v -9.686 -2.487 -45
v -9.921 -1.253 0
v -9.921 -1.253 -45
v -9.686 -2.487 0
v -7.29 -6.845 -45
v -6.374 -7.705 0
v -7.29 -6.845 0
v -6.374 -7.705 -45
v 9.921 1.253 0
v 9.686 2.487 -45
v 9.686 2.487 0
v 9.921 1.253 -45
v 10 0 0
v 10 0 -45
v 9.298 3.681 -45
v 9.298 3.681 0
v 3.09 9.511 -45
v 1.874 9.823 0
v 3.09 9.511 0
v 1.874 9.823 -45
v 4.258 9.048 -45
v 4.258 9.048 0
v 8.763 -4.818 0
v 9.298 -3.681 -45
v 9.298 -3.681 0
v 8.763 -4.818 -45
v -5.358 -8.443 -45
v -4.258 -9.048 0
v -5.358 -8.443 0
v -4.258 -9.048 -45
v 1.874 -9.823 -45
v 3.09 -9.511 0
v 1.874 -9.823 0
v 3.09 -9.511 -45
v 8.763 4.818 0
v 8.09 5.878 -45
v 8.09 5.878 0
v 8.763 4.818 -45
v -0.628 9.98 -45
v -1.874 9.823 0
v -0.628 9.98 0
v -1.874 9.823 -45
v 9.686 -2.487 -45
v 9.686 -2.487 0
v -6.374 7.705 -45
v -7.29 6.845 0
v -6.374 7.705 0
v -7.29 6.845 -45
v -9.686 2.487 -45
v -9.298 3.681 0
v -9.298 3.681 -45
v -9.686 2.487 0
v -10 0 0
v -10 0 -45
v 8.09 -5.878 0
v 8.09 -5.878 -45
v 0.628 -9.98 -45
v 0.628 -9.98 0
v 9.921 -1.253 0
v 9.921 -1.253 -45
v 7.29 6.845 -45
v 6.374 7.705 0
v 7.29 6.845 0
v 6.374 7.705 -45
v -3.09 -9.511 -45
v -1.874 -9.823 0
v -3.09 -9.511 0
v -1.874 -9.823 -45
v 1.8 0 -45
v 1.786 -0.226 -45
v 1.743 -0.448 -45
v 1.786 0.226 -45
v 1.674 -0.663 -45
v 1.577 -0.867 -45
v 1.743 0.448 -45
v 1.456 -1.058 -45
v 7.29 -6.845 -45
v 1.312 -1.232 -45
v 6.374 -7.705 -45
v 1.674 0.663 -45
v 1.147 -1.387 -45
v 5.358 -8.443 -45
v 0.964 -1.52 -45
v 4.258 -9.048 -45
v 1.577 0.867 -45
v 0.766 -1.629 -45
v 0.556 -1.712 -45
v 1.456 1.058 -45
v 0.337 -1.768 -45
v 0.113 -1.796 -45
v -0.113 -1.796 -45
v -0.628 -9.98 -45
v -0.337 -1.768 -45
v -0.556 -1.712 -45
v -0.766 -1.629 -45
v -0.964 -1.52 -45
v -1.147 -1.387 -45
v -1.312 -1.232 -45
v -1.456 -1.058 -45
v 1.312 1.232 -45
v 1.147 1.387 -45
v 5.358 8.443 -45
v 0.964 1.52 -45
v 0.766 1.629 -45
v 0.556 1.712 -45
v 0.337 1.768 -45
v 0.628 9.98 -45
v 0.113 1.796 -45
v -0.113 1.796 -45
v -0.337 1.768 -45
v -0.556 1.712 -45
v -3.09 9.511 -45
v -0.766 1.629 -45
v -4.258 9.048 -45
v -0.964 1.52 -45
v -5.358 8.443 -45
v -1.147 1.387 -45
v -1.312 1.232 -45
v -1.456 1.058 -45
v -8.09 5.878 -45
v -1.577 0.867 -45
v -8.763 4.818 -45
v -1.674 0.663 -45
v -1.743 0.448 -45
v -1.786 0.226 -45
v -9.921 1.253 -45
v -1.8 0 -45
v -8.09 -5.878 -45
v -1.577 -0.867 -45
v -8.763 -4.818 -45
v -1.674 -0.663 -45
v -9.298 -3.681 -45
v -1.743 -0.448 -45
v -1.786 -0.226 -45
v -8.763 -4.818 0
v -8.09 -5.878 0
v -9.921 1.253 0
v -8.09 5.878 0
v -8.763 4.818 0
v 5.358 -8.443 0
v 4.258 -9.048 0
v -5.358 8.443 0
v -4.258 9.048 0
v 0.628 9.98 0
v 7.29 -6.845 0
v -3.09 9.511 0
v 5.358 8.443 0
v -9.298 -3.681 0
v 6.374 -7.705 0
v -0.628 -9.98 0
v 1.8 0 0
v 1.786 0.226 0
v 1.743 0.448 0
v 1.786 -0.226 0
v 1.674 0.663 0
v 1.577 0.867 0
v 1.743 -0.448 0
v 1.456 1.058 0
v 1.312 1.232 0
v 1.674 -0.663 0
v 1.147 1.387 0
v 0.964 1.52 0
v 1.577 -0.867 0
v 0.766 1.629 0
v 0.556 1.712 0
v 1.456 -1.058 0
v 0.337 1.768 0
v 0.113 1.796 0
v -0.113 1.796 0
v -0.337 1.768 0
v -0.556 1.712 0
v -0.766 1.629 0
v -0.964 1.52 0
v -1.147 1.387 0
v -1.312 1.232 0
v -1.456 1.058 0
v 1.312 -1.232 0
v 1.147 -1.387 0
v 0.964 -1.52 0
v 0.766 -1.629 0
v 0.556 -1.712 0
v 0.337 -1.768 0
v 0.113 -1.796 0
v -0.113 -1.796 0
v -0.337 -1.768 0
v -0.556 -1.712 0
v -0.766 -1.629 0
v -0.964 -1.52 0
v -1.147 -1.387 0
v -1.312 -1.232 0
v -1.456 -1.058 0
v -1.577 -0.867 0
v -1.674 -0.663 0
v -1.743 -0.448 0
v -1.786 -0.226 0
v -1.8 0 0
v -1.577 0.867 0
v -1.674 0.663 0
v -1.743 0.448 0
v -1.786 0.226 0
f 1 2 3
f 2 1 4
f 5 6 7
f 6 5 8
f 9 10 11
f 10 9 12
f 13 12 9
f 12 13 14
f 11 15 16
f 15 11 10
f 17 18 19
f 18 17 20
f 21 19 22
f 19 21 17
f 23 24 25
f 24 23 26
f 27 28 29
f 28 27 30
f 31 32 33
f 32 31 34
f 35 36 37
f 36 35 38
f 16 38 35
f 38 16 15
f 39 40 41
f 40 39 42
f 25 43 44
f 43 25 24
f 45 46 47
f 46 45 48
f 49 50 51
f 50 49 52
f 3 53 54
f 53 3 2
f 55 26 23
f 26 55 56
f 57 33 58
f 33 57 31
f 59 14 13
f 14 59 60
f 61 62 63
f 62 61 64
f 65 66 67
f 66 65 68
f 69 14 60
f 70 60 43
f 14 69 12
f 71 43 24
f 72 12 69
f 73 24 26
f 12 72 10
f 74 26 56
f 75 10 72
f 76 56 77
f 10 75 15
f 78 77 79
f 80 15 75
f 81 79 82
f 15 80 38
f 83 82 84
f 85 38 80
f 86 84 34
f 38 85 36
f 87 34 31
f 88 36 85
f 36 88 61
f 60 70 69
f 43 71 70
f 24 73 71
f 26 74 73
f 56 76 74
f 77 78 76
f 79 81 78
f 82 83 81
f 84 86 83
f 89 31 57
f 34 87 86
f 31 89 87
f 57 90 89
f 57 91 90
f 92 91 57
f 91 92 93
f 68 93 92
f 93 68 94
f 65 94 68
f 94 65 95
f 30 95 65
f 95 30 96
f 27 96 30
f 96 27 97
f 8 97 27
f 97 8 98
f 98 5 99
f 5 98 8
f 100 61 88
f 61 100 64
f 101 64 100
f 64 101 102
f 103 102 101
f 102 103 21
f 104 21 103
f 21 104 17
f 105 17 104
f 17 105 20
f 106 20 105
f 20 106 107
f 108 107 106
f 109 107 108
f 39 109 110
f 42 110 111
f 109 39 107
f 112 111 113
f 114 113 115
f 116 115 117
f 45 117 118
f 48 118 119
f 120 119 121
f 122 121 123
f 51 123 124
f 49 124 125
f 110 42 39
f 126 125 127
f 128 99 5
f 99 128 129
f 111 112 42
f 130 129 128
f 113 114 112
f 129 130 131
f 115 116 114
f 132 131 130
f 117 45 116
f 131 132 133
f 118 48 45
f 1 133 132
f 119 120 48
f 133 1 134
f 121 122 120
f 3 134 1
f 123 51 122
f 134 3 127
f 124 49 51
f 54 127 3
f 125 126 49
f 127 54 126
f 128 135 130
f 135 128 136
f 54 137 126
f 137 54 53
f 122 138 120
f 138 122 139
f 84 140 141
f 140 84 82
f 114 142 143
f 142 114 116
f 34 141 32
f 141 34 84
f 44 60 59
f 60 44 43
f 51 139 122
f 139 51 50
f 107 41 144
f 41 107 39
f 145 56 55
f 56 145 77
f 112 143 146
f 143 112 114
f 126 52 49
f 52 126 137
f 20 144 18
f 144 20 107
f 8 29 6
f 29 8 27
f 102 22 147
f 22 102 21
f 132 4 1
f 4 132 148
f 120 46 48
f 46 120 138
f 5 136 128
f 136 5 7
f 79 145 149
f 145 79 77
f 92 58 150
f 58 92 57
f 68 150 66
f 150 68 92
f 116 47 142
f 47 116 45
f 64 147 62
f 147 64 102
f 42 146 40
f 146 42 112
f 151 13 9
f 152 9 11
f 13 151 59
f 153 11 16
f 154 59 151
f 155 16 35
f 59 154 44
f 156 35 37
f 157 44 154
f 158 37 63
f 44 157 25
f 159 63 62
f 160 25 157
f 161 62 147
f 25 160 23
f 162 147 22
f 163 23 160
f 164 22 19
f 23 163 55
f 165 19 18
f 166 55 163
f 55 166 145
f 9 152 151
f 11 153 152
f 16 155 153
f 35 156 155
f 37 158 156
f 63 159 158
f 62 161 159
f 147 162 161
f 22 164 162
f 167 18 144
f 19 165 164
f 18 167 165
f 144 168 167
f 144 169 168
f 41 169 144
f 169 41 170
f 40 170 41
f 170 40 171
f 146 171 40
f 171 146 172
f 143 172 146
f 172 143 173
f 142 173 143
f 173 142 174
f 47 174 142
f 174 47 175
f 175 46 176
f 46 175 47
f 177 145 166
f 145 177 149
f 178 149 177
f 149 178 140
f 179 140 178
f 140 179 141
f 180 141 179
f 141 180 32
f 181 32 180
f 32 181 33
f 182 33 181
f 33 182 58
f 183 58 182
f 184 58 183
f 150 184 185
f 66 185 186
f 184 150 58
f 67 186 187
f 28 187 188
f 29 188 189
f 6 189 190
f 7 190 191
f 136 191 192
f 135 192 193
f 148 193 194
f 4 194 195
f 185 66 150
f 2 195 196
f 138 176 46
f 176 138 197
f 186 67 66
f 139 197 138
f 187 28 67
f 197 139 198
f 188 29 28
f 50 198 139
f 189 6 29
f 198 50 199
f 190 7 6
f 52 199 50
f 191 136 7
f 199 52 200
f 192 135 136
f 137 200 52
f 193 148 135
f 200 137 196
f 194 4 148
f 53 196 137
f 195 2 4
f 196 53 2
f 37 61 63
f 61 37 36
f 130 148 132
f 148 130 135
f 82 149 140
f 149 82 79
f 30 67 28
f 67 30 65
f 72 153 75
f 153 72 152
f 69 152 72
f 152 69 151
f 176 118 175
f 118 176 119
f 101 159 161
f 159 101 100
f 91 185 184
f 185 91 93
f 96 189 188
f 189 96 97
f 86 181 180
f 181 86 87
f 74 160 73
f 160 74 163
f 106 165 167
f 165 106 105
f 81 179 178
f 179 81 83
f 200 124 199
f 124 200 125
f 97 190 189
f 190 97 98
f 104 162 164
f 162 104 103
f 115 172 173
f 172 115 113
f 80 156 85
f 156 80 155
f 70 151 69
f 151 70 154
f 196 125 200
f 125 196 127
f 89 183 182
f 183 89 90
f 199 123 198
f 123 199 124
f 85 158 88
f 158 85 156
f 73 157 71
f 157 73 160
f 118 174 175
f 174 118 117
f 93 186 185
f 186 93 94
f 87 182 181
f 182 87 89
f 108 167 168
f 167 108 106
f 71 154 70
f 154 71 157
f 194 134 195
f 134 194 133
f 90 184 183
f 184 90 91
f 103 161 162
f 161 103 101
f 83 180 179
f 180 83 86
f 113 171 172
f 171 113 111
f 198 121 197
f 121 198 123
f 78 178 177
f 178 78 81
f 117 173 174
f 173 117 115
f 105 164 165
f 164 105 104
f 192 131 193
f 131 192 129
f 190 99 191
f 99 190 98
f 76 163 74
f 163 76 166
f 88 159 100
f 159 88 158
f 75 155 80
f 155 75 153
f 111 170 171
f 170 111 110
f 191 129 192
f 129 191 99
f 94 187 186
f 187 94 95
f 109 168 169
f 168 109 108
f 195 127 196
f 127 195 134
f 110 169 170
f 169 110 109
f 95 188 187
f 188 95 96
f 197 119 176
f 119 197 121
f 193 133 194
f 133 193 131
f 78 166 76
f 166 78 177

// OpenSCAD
$fn = 50;


difference() {
	union() {
		translate(v = [0, 0, -45.0000000000]) {
			cylinder(h = 45, r = 10.0000000000);
		}
		cylinder(h = 0, r = 20.0000000000);
	}
	union() {
		#translate(v = [0, 0, -45]) {
			cylinder(h = 45, r = 1.8000000000);
		}
	}
}
